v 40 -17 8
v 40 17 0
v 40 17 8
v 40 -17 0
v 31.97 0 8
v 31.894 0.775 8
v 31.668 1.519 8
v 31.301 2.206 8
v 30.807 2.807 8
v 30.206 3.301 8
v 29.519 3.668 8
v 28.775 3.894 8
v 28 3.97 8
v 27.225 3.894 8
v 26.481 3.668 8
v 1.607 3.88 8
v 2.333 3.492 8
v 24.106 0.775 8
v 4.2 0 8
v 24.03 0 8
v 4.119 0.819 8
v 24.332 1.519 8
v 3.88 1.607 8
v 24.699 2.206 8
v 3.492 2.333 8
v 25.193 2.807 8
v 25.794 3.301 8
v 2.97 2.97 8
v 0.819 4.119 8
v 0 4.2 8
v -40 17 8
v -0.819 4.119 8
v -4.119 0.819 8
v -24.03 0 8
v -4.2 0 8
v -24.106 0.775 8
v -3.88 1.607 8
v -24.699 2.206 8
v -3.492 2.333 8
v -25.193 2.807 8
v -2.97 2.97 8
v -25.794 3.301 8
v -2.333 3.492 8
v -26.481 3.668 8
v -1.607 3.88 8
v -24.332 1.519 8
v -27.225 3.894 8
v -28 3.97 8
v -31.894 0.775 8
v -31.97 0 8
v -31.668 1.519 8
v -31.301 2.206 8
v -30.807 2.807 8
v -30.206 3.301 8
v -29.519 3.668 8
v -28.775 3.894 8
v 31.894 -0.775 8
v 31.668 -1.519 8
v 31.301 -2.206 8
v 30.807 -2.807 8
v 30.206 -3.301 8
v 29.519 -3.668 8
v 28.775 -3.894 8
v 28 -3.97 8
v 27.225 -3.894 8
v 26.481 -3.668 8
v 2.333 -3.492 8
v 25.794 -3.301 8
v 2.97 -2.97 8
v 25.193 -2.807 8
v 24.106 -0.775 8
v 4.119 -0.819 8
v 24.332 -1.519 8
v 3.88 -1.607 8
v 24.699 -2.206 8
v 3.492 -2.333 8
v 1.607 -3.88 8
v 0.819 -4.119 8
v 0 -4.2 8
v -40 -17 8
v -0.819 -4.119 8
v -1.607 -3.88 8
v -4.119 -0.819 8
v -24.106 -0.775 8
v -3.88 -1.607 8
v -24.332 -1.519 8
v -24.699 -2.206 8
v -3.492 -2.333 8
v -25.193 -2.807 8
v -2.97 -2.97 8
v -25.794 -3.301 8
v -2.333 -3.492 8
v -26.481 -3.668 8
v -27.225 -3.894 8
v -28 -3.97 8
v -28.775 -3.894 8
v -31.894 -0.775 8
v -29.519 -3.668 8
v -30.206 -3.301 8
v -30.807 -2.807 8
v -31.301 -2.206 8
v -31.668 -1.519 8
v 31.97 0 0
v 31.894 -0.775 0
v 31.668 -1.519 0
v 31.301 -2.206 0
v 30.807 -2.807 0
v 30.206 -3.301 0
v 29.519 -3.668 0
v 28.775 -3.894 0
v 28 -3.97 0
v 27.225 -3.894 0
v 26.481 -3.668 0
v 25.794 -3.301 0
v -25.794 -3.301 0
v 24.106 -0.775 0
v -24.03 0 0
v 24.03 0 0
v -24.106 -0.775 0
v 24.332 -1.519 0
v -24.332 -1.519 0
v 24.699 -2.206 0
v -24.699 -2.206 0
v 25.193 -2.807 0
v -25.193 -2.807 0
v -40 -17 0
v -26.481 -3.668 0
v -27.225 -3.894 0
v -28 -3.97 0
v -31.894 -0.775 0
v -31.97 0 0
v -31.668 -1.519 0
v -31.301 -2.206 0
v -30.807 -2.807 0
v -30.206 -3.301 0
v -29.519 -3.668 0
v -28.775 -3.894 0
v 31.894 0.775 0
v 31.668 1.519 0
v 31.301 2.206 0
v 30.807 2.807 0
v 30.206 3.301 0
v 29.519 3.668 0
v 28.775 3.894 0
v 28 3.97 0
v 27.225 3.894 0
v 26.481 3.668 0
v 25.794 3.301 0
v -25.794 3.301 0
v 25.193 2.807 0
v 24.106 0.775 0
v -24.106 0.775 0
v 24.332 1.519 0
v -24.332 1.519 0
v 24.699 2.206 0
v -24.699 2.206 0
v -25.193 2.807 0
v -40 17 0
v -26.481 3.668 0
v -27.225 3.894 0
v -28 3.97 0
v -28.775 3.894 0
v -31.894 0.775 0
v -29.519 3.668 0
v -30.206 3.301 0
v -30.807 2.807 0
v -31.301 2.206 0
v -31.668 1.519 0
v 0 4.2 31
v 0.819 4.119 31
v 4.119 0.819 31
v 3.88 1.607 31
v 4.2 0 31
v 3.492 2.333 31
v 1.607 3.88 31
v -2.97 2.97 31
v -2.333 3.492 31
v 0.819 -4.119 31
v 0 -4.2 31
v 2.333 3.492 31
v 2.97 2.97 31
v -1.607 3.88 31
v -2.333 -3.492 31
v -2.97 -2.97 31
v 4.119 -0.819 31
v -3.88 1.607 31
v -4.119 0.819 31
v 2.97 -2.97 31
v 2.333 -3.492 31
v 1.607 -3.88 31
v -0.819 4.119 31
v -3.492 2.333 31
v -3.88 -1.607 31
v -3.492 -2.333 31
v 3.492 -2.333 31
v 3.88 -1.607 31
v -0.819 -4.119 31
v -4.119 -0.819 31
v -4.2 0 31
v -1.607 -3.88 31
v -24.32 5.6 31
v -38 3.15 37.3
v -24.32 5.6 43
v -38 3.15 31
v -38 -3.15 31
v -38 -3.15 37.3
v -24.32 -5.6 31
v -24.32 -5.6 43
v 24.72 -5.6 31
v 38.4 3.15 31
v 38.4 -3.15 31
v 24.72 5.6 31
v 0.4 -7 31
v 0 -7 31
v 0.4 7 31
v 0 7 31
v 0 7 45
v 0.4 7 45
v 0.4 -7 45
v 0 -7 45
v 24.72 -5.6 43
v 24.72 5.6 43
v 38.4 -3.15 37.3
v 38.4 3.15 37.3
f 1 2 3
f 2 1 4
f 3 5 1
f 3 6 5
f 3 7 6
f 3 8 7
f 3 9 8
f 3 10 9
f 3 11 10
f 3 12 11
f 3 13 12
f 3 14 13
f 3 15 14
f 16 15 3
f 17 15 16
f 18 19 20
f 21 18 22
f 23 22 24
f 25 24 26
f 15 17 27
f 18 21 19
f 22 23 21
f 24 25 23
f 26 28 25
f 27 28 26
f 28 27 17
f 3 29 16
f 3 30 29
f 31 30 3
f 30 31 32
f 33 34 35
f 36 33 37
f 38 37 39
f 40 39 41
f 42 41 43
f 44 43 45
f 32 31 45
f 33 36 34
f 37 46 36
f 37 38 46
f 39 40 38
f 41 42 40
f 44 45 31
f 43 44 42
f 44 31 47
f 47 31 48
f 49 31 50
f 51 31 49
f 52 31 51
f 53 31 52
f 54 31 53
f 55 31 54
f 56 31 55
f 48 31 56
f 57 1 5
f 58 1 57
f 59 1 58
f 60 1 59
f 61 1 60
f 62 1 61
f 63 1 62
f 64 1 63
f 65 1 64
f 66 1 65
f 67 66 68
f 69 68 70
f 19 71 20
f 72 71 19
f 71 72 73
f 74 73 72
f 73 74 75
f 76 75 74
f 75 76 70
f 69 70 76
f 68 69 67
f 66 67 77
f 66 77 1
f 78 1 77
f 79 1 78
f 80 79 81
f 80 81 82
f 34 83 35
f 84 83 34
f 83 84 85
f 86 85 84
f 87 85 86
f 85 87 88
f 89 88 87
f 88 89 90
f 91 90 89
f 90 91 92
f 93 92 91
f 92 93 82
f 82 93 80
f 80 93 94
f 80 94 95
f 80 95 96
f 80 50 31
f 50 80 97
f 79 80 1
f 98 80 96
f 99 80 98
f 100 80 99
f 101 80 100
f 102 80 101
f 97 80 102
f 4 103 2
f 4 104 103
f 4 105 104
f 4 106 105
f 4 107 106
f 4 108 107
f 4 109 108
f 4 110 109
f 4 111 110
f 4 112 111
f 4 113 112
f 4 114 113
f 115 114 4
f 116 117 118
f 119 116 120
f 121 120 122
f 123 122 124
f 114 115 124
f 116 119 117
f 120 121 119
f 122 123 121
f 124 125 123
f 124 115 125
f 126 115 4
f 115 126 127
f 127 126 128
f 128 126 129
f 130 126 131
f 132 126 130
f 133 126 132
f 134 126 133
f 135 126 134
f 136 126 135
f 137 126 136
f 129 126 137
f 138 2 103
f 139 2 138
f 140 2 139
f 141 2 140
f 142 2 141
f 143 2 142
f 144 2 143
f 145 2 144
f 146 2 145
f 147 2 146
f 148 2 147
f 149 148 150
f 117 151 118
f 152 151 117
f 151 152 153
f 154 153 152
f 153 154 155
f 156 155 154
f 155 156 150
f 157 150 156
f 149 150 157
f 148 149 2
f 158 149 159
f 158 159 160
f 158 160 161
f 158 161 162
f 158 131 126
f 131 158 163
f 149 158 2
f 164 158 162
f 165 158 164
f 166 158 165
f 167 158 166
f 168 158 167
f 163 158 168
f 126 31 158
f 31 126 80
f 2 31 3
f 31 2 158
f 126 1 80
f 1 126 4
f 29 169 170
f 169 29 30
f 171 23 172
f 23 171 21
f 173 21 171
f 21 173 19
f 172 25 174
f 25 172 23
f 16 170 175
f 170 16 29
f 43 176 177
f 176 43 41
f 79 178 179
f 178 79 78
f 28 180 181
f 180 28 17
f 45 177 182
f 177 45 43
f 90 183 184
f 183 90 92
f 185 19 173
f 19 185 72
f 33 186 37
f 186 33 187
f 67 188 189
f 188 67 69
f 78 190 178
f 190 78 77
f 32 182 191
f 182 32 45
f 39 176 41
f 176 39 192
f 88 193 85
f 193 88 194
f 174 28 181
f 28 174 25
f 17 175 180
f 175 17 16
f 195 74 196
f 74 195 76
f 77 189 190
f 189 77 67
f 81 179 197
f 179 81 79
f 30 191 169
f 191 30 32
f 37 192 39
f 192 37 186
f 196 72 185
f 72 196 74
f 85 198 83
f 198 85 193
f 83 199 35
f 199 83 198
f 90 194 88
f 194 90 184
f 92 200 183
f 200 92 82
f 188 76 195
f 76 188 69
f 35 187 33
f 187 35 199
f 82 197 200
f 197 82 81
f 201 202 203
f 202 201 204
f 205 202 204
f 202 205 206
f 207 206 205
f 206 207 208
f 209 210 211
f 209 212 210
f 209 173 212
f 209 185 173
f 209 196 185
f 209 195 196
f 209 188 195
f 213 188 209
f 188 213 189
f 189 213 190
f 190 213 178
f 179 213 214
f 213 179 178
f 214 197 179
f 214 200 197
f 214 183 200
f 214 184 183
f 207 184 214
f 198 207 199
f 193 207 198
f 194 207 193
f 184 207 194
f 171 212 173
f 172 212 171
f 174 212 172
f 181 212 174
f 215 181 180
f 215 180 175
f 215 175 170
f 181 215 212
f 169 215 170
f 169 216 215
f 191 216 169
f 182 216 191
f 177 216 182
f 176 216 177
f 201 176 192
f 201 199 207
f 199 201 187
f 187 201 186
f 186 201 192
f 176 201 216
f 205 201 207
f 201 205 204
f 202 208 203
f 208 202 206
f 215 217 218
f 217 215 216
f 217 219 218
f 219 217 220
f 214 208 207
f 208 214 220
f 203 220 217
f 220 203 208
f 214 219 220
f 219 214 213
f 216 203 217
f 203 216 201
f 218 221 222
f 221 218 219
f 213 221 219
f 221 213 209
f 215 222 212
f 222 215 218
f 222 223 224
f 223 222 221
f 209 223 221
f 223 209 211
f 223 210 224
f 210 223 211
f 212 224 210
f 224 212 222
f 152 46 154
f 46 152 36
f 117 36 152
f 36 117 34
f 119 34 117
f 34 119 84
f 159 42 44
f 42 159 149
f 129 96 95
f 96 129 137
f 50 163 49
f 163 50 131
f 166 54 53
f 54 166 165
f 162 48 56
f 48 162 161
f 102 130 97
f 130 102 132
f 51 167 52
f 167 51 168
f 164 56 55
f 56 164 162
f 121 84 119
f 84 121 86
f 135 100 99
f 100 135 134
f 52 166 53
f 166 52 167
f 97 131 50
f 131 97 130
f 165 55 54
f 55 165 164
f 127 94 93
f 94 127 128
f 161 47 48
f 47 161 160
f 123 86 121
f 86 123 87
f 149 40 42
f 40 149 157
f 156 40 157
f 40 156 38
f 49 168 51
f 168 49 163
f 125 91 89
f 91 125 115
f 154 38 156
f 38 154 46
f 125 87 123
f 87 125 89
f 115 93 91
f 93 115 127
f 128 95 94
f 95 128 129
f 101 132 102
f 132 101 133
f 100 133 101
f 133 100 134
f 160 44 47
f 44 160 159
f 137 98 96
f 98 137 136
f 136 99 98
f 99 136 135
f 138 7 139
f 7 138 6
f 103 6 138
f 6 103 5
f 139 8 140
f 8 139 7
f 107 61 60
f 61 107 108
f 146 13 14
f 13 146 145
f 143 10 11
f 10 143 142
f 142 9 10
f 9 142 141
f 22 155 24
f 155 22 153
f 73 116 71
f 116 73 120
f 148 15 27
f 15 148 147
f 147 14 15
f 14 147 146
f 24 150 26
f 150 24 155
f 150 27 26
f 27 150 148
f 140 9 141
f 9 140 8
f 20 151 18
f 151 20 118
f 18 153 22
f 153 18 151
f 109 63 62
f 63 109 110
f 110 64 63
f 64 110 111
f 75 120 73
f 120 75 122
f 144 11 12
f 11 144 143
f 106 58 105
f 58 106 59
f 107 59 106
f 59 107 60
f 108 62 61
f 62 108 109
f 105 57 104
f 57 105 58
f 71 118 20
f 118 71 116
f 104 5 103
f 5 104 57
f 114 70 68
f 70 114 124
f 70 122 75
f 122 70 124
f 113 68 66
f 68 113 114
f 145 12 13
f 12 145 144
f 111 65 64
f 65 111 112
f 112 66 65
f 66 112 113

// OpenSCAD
$fn = 32;

// ----------------------------------------------------------------------
// Boat cleat: 80 mm base, horn 38 mm up
// ----------------------------------------------------------------------

// --- parameters (mm) ---
base_l = 80;              // base length
base_w = 34;              // base width
base_t = 8;               // base thickness
horn_len = 76;            // horn length
horn_d = 14;              // horn diameter at the middle
horn_z = 38;              // horn axis height
end_drop = 8;             // how far the horn tips drop
post_d = 8.4;             // centre post diameter
holes_d = 7.94;           // fixing holes
hole_x = 28;              // fixing hole spacing

difference() {
  union() {
    translate([-40, -17, 0]) cube([base_l, base_w, base_t]);
    /* centre post, sunk 1 mm into the base */
    translate([0, 0, 7]) cylinder(h = 31, d = post_d);
    /* horn: a hull chain of boxes, full in the middle and lighter at the tips */
    hull() {
      translate([-38, -3.15, 31]) cube([0.4, 6.3, 6.3], center = false);
      translate([-24.32, -5.6, 31]) cube([0.4, 11.2, 12], center = false);
    }
    hull() {
      translate([-24.32, -5.6, 31]) cube([0.4, 11.2, 12], center = false);
      translate([0, -7, 31]) cube([0.4, 14, 14], center = false);
    }
    hull() {
      translate([0, -7, 31]) cube([0.4, 14, 14], center = false);
      translate([24.32, -5.6, 31]) cube([0.4, 11.2, 12], center = false);
    }
    hull() {
      translate([24.32, -5.6, 31]) cube([0.4, 11.2, 12], center = false);
      translate([38, -3.15, 31]) cube([0.4, 6.3, 6.3], center = false);
    }
  }
  translate([-28, 0, -2.5]) cylinder(h = base_t + 5, d = holes_d);
  translate([28, 0, -2.5]) cylinder(h = base_t + 5, d = holes_d);
}
